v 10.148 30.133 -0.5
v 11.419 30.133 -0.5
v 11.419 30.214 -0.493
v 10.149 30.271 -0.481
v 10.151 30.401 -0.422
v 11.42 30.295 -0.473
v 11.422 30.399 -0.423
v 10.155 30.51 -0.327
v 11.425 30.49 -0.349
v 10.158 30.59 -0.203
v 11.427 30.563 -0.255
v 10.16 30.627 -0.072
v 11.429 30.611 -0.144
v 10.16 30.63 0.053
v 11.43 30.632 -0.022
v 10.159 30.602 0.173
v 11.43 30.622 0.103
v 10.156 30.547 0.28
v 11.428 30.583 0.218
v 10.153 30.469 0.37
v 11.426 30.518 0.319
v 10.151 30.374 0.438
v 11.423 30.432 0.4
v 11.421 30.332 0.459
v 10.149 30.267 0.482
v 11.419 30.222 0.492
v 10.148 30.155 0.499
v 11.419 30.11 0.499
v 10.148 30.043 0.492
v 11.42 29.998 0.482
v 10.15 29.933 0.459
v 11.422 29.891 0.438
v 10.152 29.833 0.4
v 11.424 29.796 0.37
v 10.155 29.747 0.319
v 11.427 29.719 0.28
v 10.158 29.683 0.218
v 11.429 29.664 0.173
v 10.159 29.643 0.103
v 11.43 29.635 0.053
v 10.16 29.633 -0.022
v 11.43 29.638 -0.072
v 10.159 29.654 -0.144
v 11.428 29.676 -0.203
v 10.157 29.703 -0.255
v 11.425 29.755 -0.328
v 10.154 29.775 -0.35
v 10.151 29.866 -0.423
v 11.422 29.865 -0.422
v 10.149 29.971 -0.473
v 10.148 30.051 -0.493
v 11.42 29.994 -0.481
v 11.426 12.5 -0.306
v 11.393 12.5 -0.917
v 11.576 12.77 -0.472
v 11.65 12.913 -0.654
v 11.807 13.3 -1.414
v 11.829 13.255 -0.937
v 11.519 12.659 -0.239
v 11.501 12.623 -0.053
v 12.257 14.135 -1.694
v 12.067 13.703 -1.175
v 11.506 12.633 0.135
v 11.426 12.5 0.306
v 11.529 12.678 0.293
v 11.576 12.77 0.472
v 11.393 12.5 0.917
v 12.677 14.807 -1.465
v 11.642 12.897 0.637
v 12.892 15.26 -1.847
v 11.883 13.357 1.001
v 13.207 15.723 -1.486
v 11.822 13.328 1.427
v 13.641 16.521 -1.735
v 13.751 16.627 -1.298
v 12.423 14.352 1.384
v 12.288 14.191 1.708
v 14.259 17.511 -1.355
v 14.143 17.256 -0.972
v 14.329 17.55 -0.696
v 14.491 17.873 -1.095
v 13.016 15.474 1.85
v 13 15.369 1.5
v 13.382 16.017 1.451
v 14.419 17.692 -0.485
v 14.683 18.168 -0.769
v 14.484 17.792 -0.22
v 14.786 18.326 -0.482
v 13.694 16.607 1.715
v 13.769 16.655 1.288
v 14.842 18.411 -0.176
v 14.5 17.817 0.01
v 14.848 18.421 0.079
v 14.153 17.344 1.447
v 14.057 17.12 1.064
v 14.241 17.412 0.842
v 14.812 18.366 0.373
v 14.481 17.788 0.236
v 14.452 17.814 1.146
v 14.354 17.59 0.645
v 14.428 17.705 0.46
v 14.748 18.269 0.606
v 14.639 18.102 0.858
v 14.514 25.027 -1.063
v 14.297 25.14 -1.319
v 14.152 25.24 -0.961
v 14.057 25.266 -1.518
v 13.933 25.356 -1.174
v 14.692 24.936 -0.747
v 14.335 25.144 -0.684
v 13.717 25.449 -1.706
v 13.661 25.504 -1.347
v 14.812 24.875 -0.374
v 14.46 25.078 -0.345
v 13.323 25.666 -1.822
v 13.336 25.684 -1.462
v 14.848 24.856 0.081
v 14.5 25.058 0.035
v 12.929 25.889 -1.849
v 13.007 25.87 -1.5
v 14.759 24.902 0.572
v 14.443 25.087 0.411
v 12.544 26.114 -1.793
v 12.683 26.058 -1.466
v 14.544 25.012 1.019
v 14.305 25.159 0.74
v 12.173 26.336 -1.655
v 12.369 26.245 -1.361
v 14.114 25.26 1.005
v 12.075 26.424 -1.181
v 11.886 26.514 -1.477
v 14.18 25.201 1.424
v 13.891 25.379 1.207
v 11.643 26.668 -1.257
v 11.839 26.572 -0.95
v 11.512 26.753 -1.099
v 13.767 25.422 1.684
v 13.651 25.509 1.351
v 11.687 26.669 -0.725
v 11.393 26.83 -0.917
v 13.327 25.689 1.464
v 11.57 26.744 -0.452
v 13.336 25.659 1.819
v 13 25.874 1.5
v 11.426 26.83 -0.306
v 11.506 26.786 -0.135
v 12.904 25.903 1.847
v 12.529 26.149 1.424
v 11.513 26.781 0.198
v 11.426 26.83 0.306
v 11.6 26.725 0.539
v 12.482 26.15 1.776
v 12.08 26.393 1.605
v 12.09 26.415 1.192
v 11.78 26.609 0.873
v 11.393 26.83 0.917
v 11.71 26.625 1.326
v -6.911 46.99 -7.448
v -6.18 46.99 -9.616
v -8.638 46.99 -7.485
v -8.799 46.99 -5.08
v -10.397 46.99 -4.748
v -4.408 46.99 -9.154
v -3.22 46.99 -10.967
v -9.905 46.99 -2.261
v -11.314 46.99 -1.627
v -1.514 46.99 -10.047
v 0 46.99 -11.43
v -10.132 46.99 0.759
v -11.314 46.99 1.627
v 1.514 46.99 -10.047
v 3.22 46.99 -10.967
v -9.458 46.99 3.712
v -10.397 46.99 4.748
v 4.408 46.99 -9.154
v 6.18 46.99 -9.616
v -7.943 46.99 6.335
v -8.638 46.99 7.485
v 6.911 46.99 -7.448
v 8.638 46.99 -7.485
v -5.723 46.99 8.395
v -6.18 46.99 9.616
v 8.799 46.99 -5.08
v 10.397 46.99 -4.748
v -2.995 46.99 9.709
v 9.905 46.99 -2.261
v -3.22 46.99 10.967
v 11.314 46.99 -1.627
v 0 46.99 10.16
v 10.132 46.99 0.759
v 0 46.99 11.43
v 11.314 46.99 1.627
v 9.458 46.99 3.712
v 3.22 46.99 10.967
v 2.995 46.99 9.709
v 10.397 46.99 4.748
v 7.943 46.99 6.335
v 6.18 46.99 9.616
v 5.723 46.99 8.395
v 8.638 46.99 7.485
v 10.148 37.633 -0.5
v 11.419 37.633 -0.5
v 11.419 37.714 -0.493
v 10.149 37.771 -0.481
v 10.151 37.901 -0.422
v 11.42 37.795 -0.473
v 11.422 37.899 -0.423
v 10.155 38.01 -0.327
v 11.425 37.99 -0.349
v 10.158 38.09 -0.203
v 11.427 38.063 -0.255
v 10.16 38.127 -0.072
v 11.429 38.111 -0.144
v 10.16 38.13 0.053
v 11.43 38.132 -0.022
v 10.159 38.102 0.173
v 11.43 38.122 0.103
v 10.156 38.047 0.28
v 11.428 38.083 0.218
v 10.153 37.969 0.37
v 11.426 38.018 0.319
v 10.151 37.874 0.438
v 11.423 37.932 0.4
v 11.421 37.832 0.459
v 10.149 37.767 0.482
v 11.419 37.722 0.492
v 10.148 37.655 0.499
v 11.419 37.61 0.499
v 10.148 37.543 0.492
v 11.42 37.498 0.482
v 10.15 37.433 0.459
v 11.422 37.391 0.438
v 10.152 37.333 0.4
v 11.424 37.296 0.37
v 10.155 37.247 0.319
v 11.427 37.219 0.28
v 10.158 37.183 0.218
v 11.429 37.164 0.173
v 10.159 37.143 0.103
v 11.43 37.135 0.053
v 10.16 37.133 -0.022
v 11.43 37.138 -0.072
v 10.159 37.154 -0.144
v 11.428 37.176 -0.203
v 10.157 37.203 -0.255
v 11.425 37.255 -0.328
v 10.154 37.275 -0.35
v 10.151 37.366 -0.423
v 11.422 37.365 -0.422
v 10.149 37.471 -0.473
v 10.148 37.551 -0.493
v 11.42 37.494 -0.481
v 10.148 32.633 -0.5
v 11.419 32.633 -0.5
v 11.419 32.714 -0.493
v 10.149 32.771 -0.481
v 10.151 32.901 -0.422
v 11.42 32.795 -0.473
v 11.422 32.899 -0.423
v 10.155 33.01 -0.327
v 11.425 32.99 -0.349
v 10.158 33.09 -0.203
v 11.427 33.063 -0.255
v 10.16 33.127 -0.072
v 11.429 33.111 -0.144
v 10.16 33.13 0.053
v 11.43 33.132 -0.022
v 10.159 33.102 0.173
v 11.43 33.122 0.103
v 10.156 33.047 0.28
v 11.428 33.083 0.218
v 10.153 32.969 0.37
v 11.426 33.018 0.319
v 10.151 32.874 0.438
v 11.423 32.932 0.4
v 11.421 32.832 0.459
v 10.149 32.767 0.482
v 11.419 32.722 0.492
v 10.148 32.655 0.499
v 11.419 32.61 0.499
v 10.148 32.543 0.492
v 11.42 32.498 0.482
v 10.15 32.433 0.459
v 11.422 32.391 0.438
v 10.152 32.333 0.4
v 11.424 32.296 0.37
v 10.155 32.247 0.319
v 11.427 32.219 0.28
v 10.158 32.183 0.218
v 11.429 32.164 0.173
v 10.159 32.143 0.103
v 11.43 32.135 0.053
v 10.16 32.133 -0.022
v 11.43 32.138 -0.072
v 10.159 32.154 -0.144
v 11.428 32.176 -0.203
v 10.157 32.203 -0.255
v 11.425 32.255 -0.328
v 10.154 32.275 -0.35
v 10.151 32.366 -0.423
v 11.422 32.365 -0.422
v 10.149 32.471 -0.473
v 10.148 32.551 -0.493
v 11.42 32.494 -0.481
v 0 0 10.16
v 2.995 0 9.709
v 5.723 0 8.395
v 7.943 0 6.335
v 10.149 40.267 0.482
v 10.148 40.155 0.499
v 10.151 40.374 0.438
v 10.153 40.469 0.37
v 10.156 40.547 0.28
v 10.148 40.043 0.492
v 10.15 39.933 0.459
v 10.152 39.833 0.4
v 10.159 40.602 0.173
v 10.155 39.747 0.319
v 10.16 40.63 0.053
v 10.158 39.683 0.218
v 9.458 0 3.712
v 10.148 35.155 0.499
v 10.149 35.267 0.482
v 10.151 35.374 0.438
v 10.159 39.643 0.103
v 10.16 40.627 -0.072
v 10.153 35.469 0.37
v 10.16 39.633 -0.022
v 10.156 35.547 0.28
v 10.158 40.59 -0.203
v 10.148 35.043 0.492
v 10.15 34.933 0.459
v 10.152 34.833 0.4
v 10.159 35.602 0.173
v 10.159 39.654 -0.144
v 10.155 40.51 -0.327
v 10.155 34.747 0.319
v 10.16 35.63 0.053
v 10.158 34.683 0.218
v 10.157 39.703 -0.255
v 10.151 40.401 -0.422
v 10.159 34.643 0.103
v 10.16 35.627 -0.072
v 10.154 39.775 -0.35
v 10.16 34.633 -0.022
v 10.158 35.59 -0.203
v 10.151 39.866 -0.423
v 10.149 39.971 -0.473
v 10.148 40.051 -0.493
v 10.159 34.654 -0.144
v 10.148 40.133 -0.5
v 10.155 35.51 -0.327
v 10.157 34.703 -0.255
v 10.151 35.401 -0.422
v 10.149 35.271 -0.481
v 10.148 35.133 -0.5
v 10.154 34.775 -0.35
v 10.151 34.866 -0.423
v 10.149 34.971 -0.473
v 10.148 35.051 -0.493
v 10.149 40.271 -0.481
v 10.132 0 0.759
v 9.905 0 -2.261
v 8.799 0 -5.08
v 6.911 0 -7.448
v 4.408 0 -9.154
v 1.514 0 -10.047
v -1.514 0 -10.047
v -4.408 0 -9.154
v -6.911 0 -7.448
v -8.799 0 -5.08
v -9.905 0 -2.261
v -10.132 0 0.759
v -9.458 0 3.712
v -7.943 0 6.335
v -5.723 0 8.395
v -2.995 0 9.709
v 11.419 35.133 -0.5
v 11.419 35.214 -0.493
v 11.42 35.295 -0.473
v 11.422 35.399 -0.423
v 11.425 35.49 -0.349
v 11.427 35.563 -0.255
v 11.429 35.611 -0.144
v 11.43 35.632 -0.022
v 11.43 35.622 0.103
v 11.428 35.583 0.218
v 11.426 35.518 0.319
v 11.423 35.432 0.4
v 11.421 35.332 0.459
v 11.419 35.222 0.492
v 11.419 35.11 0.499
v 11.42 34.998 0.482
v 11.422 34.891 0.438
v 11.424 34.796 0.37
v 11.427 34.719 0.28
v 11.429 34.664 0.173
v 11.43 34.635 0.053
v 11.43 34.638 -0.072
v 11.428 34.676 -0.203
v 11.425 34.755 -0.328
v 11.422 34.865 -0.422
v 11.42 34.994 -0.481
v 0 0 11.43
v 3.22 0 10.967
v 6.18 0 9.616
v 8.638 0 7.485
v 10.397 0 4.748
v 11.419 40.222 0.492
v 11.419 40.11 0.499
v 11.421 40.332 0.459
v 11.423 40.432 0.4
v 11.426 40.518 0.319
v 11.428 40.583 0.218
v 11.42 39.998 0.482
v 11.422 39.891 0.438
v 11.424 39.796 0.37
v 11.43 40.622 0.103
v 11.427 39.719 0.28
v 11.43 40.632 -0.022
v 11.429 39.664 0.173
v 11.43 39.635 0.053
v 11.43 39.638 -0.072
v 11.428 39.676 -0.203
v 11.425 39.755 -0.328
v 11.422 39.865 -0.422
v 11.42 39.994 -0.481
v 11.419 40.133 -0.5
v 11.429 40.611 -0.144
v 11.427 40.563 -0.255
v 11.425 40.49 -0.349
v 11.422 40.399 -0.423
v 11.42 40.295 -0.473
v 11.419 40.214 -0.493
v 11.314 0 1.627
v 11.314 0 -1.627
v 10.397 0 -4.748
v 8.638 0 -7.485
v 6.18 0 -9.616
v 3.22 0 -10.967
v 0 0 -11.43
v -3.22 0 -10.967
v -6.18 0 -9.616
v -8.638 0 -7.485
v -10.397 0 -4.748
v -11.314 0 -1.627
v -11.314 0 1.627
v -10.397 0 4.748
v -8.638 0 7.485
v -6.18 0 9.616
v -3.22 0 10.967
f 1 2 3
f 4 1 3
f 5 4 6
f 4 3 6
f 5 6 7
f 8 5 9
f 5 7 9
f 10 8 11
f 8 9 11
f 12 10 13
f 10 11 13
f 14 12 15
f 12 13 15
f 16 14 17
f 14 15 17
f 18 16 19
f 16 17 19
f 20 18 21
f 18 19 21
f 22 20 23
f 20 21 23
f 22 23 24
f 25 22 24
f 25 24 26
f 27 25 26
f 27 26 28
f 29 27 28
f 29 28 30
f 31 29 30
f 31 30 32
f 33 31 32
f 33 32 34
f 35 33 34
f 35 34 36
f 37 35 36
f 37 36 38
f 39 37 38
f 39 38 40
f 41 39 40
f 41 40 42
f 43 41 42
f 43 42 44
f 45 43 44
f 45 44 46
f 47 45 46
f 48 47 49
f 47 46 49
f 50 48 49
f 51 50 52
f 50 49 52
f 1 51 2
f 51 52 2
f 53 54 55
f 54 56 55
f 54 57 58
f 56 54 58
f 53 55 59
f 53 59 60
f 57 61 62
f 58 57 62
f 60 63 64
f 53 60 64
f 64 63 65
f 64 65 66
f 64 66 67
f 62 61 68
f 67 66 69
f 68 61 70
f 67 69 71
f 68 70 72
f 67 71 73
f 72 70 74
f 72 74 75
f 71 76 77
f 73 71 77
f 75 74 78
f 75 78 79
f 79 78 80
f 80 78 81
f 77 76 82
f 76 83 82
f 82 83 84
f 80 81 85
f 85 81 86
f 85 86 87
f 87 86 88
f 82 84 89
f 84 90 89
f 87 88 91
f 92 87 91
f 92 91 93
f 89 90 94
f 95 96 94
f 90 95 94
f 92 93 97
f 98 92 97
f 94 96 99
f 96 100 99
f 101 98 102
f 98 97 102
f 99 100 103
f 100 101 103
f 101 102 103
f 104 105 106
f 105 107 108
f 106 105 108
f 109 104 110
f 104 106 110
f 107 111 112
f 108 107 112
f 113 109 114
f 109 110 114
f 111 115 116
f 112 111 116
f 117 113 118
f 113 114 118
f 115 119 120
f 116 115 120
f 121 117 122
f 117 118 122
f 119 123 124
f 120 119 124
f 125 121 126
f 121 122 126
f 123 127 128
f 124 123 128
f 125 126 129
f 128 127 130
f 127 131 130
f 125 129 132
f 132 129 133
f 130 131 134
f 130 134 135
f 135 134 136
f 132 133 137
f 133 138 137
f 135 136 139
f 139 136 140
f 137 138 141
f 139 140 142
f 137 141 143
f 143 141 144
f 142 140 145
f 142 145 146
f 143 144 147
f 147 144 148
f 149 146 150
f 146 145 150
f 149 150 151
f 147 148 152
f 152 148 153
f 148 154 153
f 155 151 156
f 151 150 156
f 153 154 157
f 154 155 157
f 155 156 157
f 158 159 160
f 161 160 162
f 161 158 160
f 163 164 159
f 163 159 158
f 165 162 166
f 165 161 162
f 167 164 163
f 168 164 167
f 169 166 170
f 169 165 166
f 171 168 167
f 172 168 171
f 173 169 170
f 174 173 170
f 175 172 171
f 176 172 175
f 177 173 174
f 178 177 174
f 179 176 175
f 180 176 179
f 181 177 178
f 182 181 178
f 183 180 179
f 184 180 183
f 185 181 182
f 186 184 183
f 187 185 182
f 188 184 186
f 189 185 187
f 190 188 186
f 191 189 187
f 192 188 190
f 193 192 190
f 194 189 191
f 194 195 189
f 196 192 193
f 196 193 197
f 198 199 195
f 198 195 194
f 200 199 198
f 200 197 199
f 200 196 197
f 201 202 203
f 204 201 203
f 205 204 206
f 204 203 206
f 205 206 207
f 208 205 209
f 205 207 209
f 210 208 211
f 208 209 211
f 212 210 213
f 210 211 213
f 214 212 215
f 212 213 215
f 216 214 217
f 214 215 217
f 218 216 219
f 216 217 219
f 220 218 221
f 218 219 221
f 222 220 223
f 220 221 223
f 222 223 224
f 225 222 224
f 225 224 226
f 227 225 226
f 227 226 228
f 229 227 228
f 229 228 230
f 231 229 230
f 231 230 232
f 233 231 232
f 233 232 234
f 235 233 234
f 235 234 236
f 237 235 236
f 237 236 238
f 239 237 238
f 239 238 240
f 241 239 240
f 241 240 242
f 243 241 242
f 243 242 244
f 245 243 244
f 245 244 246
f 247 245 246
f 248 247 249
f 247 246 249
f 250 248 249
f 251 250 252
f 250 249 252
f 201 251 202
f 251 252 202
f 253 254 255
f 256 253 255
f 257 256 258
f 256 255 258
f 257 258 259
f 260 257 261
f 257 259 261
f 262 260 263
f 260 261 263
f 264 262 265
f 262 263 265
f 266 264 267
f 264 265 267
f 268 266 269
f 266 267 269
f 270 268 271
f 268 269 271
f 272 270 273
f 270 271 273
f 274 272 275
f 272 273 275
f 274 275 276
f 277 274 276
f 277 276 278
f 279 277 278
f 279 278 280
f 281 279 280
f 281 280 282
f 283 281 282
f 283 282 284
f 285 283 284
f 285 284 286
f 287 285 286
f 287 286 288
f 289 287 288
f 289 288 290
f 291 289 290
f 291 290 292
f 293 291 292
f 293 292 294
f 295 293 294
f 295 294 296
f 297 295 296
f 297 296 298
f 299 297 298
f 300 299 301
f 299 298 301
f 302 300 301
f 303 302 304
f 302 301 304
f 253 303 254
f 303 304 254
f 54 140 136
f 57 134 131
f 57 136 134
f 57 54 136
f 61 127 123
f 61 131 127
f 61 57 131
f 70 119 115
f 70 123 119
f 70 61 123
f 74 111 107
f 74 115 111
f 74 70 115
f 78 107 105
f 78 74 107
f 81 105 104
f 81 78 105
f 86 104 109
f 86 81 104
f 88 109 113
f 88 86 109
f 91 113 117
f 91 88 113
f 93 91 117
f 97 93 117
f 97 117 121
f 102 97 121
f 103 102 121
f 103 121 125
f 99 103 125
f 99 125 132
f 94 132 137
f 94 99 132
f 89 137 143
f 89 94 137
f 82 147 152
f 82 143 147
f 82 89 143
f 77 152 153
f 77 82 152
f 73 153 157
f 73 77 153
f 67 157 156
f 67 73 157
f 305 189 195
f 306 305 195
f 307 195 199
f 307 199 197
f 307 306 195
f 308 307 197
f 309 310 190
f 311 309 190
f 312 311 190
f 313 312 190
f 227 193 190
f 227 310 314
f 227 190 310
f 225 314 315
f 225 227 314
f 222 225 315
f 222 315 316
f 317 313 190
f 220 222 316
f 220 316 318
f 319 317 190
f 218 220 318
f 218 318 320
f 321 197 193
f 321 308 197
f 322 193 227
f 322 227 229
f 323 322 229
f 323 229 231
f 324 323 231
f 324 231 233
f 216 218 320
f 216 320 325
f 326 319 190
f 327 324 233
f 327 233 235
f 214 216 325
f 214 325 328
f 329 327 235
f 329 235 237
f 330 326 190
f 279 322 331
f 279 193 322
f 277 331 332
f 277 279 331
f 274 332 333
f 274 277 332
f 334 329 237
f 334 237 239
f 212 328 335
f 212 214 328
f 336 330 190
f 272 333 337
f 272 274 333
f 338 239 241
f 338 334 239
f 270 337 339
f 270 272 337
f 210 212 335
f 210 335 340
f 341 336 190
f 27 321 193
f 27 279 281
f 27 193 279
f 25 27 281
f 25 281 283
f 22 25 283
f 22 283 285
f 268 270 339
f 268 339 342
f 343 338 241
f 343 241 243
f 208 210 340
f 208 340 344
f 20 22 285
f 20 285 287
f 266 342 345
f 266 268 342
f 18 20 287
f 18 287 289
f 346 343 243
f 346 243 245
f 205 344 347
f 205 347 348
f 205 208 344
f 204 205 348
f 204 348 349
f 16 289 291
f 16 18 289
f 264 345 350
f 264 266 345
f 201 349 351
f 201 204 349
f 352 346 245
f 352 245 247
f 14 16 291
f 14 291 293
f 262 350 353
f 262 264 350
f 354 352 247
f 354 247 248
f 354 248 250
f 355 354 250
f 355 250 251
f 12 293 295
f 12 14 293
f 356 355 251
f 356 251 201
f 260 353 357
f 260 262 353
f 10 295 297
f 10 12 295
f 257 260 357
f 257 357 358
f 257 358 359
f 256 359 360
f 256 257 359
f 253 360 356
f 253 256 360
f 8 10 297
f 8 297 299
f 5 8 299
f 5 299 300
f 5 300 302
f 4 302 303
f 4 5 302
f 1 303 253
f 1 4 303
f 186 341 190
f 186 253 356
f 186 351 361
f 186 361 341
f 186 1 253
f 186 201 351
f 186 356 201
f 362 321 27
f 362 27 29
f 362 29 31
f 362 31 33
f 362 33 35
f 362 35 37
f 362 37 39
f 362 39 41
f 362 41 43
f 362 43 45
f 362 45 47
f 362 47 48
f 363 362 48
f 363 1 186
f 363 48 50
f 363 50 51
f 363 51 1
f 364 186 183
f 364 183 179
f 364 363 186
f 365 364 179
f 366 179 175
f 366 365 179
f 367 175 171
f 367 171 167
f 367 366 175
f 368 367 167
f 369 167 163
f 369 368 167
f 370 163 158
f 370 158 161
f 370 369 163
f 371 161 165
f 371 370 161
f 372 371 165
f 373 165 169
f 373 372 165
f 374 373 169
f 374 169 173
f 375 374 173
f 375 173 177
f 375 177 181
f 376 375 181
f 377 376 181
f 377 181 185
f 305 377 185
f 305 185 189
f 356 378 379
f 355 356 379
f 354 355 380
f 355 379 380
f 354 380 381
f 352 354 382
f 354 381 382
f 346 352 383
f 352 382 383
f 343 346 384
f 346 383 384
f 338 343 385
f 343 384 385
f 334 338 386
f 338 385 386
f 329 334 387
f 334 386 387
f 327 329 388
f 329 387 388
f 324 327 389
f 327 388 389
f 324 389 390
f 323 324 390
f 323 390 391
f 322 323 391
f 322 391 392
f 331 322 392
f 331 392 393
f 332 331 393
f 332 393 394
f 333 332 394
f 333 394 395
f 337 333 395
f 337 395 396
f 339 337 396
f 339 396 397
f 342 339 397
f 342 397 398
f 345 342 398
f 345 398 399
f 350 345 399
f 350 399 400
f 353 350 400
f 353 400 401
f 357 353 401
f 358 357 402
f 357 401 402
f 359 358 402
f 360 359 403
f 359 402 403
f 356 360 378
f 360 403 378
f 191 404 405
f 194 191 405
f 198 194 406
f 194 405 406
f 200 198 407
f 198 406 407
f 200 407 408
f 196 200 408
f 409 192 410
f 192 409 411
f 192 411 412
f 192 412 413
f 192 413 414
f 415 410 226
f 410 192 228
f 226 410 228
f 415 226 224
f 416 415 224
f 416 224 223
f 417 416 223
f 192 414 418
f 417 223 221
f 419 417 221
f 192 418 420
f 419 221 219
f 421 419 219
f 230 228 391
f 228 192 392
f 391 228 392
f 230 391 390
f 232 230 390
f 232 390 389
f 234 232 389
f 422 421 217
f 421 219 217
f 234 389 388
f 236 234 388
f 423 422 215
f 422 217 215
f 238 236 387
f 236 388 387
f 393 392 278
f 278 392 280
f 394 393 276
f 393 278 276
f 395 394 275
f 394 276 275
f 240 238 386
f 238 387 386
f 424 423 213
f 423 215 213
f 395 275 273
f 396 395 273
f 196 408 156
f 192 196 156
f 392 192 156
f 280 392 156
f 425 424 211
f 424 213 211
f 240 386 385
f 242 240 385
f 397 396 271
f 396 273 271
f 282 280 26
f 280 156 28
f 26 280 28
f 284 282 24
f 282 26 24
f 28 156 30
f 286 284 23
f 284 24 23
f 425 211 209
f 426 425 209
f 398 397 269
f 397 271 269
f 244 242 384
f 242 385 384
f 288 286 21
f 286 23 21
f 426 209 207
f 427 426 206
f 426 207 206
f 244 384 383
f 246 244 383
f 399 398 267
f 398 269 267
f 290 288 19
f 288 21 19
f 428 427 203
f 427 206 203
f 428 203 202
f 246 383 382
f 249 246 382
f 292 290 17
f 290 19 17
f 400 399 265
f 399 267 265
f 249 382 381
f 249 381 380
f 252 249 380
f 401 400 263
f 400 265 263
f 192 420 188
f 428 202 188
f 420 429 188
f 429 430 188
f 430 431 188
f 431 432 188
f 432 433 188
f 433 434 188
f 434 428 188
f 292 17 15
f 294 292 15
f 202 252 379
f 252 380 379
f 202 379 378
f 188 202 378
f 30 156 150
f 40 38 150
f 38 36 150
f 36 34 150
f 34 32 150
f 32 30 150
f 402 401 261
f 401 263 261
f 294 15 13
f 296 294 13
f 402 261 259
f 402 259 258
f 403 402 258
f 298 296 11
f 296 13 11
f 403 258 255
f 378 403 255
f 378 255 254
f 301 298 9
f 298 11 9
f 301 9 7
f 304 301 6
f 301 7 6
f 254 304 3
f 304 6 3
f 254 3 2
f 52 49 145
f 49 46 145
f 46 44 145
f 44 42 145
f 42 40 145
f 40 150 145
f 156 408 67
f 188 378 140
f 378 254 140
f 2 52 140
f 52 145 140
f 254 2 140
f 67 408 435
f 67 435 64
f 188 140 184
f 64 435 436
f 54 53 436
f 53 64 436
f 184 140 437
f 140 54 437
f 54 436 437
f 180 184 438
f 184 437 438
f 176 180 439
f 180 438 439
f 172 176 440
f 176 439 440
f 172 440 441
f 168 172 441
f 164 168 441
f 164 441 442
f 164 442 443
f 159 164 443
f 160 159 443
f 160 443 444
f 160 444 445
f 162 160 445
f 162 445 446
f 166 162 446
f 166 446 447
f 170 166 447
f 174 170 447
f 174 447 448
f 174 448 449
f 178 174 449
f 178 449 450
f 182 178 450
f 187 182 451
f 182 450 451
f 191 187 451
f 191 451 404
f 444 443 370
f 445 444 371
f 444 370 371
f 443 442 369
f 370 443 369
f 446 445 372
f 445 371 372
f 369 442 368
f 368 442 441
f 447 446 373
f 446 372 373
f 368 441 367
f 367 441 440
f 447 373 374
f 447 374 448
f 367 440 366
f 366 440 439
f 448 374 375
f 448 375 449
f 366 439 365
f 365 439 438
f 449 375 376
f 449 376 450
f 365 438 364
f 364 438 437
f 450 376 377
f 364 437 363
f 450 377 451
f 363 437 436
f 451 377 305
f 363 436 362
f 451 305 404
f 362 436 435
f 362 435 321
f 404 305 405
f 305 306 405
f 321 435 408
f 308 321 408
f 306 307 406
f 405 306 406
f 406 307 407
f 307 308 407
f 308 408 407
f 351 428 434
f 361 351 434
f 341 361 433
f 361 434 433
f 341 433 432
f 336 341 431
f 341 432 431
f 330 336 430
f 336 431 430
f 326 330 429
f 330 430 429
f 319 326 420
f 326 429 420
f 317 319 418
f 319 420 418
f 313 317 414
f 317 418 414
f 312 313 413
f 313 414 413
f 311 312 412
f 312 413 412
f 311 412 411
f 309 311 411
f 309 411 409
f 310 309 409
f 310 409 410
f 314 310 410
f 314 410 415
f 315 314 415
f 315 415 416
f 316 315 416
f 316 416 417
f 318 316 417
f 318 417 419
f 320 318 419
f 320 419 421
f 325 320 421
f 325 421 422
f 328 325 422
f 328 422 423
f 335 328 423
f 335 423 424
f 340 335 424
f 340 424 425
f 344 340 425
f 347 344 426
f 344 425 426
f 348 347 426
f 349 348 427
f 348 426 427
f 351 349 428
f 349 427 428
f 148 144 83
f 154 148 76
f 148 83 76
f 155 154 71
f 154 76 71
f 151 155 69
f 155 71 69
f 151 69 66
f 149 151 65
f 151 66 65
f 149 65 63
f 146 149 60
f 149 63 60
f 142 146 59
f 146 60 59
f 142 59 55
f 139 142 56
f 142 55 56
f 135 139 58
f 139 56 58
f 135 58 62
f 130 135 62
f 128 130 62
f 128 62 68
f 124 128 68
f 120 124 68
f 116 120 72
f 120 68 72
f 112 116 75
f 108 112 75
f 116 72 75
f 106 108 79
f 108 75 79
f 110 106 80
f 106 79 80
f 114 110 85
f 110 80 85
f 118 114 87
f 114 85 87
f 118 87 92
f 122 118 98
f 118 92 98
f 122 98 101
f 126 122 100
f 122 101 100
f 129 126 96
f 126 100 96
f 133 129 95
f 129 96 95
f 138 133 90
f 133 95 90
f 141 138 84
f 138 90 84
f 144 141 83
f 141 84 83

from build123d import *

# Parameters (mm, degrees)
SKETCH1_R           = 11.43
SKETCH1_R_2         = 10.16
BOSS_EXTRUDE1_DEPTH = 46.99
BOSS_EXTRUDE2_START = 20
SKETCH3_R           = 1.85
SKETCH3_R_2         = 1.5
BOSS_EXTRUDE2_DEPTH = 2.5
CHAMFER4_SIZE       = 7.5
CHAMFER4_SIZE_2     = 4.330127019
CHAMFER5_SIZE       = 7.5
CHAMFER5_SIZE_2     = 4.330127019
SKETCH4_R           = 0.5
CUT_EXTRUDE1_DEPTH  = 5


with BuildPart() as part:
    # Sketch1 → Boss-Extrude1 (new body)
    with BuildSketch(Plane(origin=(0, 0, 0), x_dir=(1, 0, 0), z_dir=(0, 1, 0))):
        with Locations(Location((0, 0, 0), (0, 0, 270))):
            Circle(SKETCH1_R)
        with Locations(Location((0, 0, 0), (0, 0, 270))):
            Circle(SKETCH1_R_2, mode=Mode.SUBTRACT)
    extrude(amount=BOSS_EXTRUDE1_DEPTH)

    # Sketch3 → Boss-Extrude2 (add)
    with BuildSketch(Plane(origin=(0, 0, 0), x_dir=(1, 0, 0), z_dir=(0, 1, 0)).offset(BOSS_EXTRUDE2_START)):
        with Locations((13, 0)):
            Circle(SKETCH3_R)
        with Locations(Location((13, 0, 0), (0, 0, 270))):
            Circle(SKETCH3_R_2, mode=Mode.SUBTRACT)
    extrude(amount=BOSS_EXTRUDE2_DEPTH)

    # Chamfer4
    # the kernel refuses this chamfer: 7.5, 4.330127019 mm, written as the material it adds along each edge
    with BuildSketch(Plane(origin=(0, 20, 0), x_dir=(-0.2055966456613654, 0, -0.9786368168492308), z_dir=(-0.9786368168492308, 0, 0.2055966456613654))) as chamfer4_piece_1_section:
        Polygon((11.43, CHAMFER4_SIZE), (11.43 + CHAMFER4_SIZE_2, 0), (11.43, 0), align=None)
    chamfer4_piece_1 = revolve(axis=Axis((0, 20, 0), (0, -1, 0)), revolution_arc=203.728856682, mode=Mode.PRIVATE)
    chamfer4_piece_1 = chamfer4_piece_1 - Plane(origin=(13, 13.499486396, 0), x_dir=(0, 0, 1), z_dir=(0, -1, 0)) * Cylinder(1.5, 64, mode=Mode.PRIVATE)
    chamfer4_piece_1 = chamfer4_piece_1 & Plane(origin=(13, 13.499486396, 0), x_dir=(1, 0, 0), z_dir=(0, -1, 0)) * Cylinder(1.85, 64, mode=Mode.PRIVATE)
    add(chamfer4_piece_1)

    # Chamfer5
    # the kernel refuses this chamfer: 7.5, 4.330127019 mm, written as the material it adds along each edge
    with BuildSketch(Plane(origin=(0, 22.5, 0), x_dir=(-0.20559664566136496, 0, -0.9786368168492309), z_dir=(-0.9786368168492309, 0, 0.20559664566136496))) as chamfer5_piece_1_section:
        Polygon((11.43 + CHAMFER5_SIZE, 0), (11.43, -CHAMFER5_SIZE_2), (11.43, 0), align=None)
    chamfer5_piece_1 = revolve(axis=Axis((0, 22.5, 0), (0, -1, 0)), revolution_arc=203.728856682, mode=Mode.PRIVATE)
    chamfer5_piece_1 = chamfer5_piece_1 - Plane(origin=(13, 25.165434587, 0), x_dir=(0, 0, 1), z_dir=(0, -1, 0)) * Cylinder(1.5, 76, mode=Mode.PRIVATE)
    chamfer5_piece_1 = chamfer5_piece_1 & Plane(origin=(13, 25.165434587, 0), x_dir=(1, 0, 0), z_dir=(0, -1, 0)) * Cylinder(1.85, 76, mode=Mode.PRIVATE)
    add(chamfer5_piece_1)

    # Sketch4 → Cut-Extrude1 (cut)
    with BuildSketch(Plane(origin=(11.43, 0, 0), x_dir=(0, 0, -1), z_dir=(1, 0, 0))):
        with Locations((0, 30.132630437)):
            Circle(SKETCH4_R)
        with Locations((0, 32.632630437)):
            Circle(SKETCH4_R)
        with Locations((0, 35.132630437)):
            Circle(SKETCH4_R)
        with Locations((0, 37.632630437)):
            Circle(SKETCH4_R)
        with Locations((0, 40.132630437)):
            Circle(SKETCH4_R)
    extrude(amount=-CUT_EXTRUDE1_DEPTH, mode=Mode.SUBTRACT)


solid = part.part
